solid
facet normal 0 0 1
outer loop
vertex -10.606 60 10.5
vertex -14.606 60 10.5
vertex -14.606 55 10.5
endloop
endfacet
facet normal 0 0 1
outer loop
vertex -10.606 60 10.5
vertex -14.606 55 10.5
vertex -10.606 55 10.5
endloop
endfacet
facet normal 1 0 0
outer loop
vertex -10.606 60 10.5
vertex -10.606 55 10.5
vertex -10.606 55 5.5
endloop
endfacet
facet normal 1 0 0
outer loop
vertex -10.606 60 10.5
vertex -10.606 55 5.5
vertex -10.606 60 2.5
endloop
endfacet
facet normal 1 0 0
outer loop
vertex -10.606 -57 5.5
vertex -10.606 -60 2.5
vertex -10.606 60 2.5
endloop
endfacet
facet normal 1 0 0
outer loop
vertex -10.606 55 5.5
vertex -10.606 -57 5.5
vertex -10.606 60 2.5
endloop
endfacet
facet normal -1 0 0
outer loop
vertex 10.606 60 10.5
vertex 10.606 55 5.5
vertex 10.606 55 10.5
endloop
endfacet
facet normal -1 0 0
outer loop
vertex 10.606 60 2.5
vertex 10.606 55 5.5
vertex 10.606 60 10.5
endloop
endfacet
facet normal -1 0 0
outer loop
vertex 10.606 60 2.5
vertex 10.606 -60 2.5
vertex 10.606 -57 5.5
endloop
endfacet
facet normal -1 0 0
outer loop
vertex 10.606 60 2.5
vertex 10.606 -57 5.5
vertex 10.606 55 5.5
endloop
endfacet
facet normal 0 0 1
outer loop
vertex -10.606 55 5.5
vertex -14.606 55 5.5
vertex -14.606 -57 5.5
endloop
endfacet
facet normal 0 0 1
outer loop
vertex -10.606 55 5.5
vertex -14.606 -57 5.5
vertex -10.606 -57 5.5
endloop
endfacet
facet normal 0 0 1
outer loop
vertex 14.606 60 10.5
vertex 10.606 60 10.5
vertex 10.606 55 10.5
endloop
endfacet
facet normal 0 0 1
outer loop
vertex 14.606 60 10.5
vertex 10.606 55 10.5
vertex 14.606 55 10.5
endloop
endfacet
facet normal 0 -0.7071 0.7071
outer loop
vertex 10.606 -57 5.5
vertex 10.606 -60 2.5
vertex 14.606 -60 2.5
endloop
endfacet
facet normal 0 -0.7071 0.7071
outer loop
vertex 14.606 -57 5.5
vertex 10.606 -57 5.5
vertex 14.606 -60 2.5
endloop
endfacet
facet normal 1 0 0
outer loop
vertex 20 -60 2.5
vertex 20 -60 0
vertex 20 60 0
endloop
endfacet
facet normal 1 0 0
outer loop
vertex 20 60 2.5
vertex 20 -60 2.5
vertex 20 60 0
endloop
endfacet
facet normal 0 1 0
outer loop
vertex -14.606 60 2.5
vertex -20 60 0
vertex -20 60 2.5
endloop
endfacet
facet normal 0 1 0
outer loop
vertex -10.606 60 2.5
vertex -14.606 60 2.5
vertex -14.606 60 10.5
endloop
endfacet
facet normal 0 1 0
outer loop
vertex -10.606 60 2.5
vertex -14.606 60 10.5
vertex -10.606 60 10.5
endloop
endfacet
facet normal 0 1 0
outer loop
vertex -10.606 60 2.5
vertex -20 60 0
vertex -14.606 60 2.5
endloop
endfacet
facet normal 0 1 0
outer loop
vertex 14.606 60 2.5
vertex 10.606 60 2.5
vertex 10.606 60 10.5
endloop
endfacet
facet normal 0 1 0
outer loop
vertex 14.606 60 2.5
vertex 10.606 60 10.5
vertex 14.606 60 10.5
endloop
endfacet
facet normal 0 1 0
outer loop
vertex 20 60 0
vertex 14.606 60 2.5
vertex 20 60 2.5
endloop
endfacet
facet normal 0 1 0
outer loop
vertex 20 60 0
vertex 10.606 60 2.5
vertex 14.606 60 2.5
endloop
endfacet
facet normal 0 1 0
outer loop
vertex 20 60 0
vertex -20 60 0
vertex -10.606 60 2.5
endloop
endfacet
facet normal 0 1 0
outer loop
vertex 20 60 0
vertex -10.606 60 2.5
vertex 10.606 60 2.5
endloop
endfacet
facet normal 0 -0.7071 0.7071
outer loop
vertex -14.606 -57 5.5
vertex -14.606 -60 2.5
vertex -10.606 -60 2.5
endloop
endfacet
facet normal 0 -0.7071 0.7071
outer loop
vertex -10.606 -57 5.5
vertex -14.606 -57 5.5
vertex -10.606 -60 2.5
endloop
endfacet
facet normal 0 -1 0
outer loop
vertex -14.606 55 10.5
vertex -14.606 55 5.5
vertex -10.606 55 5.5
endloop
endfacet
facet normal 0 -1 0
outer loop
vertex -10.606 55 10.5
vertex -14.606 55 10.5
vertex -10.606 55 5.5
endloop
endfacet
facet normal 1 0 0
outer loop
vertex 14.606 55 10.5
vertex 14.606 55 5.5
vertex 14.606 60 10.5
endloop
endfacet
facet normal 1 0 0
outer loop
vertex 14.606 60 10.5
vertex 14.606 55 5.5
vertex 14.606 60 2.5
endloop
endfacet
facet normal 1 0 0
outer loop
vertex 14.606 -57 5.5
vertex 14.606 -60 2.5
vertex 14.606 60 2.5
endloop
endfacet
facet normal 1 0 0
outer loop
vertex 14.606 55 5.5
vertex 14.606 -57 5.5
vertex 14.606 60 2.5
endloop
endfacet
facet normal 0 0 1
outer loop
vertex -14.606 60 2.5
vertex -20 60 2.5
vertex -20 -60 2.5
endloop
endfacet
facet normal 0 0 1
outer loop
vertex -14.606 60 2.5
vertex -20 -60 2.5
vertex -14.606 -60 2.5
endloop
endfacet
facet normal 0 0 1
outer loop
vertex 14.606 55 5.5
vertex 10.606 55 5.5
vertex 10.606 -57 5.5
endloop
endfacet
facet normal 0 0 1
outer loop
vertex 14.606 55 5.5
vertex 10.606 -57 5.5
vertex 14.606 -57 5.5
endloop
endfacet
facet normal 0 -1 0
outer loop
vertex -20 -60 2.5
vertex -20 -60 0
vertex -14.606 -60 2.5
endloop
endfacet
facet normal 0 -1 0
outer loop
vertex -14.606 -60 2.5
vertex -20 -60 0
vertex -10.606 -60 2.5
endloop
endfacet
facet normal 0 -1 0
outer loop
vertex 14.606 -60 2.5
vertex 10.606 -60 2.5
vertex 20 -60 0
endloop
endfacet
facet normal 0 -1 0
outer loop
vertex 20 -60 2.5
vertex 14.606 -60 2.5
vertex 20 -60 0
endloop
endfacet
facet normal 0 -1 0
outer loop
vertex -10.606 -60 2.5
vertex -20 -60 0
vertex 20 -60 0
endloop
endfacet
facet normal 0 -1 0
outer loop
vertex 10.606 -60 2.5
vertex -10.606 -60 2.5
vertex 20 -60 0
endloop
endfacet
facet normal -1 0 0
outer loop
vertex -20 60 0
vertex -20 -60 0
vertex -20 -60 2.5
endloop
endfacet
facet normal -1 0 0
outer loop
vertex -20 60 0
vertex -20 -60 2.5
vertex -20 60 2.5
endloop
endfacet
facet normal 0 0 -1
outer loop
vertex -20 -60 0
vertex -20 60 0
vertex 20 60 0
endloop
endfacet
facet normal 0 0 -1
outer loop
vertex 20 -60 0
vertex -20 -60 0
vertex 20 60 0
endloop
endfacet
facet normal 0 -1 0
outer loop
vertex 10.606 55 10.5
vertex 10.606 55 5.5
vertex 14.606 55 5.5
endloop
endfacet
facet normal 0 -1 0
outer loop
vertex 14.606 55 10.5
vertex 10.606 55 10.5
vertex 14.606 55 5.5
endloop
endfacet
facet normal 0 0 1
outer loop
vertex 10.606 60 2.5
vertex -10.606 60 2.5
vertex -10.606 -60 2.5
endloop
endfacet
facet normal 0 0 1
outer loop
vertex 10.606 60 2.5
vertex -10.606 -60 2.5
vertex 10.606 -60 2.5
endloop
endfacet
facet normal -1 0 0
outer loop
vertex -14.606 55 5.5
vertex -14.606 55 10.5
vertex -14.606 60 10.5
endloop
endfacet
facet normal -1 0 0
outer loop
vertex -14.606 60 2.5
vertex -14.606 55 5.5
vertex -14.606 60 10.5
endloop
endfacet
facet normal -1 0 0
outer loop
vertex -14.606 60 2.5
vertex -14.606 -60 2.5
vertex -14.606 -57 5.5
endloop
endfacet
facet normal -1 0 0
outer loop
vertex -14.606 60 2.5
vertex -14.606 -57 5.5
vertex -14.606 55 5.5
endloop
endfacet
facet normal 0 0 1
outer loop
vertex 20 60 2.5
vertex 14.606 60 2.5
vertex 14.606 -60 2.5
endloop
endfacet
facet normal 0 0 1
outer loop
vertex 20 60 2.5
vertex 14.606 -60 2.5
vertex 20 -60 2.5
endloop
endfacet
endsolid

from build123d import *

# Parameters (mm, degrees)
F0_W     = 40
F0_H     = 120
F1_DEPTH = 2.5
F2_W     = 4
F2_H     = 120
F3_DEPTH = 3
F4_SIZE  = 3
F5_W     = 4
F5_H     = 5
F6_DEPTH = 5


with BuildPart() as f1:
    # F0 (on Top) → F1 (new body)
    with BuildSketch(Plane.XY):
        Rectangle(F0_W, F0_H)
    extrude(amount=F1_DEPTH)

    # F2 (on face) → F3 (join)
    with BuildSketch(Plane.XY.offset(2.5)):
        with Locations((-12.606392, 0)):
            Rectangle(F2_W, F2_H)
        with Locations((12.606392, 0)):
            Rectangle(F2_W, F2_H)
    extrude(amount=F3_DEPTH)

    # F4
    f4_edges = [f1.edges().sort_by_distance(p)[0] for p in [
        (-12.606392, -60, 5.5),
        (12.606392, -60, 5.5),
    ]]
    chamfer(f4_edges, length=F4_SIZE)

    # F5 (on face) → F6 (join)
    with BuildSketch(Plane.XY.offset(5.5)):
        with Locations((12.606392, 57.5)):
            Rectangle(F5_W, F5_H)
        with Locations((-12.606392, 57.5)):
            Rectangle(F5_W, F5_H)
    extrude(amount=F6_DEPTH)


solid = f1.part
